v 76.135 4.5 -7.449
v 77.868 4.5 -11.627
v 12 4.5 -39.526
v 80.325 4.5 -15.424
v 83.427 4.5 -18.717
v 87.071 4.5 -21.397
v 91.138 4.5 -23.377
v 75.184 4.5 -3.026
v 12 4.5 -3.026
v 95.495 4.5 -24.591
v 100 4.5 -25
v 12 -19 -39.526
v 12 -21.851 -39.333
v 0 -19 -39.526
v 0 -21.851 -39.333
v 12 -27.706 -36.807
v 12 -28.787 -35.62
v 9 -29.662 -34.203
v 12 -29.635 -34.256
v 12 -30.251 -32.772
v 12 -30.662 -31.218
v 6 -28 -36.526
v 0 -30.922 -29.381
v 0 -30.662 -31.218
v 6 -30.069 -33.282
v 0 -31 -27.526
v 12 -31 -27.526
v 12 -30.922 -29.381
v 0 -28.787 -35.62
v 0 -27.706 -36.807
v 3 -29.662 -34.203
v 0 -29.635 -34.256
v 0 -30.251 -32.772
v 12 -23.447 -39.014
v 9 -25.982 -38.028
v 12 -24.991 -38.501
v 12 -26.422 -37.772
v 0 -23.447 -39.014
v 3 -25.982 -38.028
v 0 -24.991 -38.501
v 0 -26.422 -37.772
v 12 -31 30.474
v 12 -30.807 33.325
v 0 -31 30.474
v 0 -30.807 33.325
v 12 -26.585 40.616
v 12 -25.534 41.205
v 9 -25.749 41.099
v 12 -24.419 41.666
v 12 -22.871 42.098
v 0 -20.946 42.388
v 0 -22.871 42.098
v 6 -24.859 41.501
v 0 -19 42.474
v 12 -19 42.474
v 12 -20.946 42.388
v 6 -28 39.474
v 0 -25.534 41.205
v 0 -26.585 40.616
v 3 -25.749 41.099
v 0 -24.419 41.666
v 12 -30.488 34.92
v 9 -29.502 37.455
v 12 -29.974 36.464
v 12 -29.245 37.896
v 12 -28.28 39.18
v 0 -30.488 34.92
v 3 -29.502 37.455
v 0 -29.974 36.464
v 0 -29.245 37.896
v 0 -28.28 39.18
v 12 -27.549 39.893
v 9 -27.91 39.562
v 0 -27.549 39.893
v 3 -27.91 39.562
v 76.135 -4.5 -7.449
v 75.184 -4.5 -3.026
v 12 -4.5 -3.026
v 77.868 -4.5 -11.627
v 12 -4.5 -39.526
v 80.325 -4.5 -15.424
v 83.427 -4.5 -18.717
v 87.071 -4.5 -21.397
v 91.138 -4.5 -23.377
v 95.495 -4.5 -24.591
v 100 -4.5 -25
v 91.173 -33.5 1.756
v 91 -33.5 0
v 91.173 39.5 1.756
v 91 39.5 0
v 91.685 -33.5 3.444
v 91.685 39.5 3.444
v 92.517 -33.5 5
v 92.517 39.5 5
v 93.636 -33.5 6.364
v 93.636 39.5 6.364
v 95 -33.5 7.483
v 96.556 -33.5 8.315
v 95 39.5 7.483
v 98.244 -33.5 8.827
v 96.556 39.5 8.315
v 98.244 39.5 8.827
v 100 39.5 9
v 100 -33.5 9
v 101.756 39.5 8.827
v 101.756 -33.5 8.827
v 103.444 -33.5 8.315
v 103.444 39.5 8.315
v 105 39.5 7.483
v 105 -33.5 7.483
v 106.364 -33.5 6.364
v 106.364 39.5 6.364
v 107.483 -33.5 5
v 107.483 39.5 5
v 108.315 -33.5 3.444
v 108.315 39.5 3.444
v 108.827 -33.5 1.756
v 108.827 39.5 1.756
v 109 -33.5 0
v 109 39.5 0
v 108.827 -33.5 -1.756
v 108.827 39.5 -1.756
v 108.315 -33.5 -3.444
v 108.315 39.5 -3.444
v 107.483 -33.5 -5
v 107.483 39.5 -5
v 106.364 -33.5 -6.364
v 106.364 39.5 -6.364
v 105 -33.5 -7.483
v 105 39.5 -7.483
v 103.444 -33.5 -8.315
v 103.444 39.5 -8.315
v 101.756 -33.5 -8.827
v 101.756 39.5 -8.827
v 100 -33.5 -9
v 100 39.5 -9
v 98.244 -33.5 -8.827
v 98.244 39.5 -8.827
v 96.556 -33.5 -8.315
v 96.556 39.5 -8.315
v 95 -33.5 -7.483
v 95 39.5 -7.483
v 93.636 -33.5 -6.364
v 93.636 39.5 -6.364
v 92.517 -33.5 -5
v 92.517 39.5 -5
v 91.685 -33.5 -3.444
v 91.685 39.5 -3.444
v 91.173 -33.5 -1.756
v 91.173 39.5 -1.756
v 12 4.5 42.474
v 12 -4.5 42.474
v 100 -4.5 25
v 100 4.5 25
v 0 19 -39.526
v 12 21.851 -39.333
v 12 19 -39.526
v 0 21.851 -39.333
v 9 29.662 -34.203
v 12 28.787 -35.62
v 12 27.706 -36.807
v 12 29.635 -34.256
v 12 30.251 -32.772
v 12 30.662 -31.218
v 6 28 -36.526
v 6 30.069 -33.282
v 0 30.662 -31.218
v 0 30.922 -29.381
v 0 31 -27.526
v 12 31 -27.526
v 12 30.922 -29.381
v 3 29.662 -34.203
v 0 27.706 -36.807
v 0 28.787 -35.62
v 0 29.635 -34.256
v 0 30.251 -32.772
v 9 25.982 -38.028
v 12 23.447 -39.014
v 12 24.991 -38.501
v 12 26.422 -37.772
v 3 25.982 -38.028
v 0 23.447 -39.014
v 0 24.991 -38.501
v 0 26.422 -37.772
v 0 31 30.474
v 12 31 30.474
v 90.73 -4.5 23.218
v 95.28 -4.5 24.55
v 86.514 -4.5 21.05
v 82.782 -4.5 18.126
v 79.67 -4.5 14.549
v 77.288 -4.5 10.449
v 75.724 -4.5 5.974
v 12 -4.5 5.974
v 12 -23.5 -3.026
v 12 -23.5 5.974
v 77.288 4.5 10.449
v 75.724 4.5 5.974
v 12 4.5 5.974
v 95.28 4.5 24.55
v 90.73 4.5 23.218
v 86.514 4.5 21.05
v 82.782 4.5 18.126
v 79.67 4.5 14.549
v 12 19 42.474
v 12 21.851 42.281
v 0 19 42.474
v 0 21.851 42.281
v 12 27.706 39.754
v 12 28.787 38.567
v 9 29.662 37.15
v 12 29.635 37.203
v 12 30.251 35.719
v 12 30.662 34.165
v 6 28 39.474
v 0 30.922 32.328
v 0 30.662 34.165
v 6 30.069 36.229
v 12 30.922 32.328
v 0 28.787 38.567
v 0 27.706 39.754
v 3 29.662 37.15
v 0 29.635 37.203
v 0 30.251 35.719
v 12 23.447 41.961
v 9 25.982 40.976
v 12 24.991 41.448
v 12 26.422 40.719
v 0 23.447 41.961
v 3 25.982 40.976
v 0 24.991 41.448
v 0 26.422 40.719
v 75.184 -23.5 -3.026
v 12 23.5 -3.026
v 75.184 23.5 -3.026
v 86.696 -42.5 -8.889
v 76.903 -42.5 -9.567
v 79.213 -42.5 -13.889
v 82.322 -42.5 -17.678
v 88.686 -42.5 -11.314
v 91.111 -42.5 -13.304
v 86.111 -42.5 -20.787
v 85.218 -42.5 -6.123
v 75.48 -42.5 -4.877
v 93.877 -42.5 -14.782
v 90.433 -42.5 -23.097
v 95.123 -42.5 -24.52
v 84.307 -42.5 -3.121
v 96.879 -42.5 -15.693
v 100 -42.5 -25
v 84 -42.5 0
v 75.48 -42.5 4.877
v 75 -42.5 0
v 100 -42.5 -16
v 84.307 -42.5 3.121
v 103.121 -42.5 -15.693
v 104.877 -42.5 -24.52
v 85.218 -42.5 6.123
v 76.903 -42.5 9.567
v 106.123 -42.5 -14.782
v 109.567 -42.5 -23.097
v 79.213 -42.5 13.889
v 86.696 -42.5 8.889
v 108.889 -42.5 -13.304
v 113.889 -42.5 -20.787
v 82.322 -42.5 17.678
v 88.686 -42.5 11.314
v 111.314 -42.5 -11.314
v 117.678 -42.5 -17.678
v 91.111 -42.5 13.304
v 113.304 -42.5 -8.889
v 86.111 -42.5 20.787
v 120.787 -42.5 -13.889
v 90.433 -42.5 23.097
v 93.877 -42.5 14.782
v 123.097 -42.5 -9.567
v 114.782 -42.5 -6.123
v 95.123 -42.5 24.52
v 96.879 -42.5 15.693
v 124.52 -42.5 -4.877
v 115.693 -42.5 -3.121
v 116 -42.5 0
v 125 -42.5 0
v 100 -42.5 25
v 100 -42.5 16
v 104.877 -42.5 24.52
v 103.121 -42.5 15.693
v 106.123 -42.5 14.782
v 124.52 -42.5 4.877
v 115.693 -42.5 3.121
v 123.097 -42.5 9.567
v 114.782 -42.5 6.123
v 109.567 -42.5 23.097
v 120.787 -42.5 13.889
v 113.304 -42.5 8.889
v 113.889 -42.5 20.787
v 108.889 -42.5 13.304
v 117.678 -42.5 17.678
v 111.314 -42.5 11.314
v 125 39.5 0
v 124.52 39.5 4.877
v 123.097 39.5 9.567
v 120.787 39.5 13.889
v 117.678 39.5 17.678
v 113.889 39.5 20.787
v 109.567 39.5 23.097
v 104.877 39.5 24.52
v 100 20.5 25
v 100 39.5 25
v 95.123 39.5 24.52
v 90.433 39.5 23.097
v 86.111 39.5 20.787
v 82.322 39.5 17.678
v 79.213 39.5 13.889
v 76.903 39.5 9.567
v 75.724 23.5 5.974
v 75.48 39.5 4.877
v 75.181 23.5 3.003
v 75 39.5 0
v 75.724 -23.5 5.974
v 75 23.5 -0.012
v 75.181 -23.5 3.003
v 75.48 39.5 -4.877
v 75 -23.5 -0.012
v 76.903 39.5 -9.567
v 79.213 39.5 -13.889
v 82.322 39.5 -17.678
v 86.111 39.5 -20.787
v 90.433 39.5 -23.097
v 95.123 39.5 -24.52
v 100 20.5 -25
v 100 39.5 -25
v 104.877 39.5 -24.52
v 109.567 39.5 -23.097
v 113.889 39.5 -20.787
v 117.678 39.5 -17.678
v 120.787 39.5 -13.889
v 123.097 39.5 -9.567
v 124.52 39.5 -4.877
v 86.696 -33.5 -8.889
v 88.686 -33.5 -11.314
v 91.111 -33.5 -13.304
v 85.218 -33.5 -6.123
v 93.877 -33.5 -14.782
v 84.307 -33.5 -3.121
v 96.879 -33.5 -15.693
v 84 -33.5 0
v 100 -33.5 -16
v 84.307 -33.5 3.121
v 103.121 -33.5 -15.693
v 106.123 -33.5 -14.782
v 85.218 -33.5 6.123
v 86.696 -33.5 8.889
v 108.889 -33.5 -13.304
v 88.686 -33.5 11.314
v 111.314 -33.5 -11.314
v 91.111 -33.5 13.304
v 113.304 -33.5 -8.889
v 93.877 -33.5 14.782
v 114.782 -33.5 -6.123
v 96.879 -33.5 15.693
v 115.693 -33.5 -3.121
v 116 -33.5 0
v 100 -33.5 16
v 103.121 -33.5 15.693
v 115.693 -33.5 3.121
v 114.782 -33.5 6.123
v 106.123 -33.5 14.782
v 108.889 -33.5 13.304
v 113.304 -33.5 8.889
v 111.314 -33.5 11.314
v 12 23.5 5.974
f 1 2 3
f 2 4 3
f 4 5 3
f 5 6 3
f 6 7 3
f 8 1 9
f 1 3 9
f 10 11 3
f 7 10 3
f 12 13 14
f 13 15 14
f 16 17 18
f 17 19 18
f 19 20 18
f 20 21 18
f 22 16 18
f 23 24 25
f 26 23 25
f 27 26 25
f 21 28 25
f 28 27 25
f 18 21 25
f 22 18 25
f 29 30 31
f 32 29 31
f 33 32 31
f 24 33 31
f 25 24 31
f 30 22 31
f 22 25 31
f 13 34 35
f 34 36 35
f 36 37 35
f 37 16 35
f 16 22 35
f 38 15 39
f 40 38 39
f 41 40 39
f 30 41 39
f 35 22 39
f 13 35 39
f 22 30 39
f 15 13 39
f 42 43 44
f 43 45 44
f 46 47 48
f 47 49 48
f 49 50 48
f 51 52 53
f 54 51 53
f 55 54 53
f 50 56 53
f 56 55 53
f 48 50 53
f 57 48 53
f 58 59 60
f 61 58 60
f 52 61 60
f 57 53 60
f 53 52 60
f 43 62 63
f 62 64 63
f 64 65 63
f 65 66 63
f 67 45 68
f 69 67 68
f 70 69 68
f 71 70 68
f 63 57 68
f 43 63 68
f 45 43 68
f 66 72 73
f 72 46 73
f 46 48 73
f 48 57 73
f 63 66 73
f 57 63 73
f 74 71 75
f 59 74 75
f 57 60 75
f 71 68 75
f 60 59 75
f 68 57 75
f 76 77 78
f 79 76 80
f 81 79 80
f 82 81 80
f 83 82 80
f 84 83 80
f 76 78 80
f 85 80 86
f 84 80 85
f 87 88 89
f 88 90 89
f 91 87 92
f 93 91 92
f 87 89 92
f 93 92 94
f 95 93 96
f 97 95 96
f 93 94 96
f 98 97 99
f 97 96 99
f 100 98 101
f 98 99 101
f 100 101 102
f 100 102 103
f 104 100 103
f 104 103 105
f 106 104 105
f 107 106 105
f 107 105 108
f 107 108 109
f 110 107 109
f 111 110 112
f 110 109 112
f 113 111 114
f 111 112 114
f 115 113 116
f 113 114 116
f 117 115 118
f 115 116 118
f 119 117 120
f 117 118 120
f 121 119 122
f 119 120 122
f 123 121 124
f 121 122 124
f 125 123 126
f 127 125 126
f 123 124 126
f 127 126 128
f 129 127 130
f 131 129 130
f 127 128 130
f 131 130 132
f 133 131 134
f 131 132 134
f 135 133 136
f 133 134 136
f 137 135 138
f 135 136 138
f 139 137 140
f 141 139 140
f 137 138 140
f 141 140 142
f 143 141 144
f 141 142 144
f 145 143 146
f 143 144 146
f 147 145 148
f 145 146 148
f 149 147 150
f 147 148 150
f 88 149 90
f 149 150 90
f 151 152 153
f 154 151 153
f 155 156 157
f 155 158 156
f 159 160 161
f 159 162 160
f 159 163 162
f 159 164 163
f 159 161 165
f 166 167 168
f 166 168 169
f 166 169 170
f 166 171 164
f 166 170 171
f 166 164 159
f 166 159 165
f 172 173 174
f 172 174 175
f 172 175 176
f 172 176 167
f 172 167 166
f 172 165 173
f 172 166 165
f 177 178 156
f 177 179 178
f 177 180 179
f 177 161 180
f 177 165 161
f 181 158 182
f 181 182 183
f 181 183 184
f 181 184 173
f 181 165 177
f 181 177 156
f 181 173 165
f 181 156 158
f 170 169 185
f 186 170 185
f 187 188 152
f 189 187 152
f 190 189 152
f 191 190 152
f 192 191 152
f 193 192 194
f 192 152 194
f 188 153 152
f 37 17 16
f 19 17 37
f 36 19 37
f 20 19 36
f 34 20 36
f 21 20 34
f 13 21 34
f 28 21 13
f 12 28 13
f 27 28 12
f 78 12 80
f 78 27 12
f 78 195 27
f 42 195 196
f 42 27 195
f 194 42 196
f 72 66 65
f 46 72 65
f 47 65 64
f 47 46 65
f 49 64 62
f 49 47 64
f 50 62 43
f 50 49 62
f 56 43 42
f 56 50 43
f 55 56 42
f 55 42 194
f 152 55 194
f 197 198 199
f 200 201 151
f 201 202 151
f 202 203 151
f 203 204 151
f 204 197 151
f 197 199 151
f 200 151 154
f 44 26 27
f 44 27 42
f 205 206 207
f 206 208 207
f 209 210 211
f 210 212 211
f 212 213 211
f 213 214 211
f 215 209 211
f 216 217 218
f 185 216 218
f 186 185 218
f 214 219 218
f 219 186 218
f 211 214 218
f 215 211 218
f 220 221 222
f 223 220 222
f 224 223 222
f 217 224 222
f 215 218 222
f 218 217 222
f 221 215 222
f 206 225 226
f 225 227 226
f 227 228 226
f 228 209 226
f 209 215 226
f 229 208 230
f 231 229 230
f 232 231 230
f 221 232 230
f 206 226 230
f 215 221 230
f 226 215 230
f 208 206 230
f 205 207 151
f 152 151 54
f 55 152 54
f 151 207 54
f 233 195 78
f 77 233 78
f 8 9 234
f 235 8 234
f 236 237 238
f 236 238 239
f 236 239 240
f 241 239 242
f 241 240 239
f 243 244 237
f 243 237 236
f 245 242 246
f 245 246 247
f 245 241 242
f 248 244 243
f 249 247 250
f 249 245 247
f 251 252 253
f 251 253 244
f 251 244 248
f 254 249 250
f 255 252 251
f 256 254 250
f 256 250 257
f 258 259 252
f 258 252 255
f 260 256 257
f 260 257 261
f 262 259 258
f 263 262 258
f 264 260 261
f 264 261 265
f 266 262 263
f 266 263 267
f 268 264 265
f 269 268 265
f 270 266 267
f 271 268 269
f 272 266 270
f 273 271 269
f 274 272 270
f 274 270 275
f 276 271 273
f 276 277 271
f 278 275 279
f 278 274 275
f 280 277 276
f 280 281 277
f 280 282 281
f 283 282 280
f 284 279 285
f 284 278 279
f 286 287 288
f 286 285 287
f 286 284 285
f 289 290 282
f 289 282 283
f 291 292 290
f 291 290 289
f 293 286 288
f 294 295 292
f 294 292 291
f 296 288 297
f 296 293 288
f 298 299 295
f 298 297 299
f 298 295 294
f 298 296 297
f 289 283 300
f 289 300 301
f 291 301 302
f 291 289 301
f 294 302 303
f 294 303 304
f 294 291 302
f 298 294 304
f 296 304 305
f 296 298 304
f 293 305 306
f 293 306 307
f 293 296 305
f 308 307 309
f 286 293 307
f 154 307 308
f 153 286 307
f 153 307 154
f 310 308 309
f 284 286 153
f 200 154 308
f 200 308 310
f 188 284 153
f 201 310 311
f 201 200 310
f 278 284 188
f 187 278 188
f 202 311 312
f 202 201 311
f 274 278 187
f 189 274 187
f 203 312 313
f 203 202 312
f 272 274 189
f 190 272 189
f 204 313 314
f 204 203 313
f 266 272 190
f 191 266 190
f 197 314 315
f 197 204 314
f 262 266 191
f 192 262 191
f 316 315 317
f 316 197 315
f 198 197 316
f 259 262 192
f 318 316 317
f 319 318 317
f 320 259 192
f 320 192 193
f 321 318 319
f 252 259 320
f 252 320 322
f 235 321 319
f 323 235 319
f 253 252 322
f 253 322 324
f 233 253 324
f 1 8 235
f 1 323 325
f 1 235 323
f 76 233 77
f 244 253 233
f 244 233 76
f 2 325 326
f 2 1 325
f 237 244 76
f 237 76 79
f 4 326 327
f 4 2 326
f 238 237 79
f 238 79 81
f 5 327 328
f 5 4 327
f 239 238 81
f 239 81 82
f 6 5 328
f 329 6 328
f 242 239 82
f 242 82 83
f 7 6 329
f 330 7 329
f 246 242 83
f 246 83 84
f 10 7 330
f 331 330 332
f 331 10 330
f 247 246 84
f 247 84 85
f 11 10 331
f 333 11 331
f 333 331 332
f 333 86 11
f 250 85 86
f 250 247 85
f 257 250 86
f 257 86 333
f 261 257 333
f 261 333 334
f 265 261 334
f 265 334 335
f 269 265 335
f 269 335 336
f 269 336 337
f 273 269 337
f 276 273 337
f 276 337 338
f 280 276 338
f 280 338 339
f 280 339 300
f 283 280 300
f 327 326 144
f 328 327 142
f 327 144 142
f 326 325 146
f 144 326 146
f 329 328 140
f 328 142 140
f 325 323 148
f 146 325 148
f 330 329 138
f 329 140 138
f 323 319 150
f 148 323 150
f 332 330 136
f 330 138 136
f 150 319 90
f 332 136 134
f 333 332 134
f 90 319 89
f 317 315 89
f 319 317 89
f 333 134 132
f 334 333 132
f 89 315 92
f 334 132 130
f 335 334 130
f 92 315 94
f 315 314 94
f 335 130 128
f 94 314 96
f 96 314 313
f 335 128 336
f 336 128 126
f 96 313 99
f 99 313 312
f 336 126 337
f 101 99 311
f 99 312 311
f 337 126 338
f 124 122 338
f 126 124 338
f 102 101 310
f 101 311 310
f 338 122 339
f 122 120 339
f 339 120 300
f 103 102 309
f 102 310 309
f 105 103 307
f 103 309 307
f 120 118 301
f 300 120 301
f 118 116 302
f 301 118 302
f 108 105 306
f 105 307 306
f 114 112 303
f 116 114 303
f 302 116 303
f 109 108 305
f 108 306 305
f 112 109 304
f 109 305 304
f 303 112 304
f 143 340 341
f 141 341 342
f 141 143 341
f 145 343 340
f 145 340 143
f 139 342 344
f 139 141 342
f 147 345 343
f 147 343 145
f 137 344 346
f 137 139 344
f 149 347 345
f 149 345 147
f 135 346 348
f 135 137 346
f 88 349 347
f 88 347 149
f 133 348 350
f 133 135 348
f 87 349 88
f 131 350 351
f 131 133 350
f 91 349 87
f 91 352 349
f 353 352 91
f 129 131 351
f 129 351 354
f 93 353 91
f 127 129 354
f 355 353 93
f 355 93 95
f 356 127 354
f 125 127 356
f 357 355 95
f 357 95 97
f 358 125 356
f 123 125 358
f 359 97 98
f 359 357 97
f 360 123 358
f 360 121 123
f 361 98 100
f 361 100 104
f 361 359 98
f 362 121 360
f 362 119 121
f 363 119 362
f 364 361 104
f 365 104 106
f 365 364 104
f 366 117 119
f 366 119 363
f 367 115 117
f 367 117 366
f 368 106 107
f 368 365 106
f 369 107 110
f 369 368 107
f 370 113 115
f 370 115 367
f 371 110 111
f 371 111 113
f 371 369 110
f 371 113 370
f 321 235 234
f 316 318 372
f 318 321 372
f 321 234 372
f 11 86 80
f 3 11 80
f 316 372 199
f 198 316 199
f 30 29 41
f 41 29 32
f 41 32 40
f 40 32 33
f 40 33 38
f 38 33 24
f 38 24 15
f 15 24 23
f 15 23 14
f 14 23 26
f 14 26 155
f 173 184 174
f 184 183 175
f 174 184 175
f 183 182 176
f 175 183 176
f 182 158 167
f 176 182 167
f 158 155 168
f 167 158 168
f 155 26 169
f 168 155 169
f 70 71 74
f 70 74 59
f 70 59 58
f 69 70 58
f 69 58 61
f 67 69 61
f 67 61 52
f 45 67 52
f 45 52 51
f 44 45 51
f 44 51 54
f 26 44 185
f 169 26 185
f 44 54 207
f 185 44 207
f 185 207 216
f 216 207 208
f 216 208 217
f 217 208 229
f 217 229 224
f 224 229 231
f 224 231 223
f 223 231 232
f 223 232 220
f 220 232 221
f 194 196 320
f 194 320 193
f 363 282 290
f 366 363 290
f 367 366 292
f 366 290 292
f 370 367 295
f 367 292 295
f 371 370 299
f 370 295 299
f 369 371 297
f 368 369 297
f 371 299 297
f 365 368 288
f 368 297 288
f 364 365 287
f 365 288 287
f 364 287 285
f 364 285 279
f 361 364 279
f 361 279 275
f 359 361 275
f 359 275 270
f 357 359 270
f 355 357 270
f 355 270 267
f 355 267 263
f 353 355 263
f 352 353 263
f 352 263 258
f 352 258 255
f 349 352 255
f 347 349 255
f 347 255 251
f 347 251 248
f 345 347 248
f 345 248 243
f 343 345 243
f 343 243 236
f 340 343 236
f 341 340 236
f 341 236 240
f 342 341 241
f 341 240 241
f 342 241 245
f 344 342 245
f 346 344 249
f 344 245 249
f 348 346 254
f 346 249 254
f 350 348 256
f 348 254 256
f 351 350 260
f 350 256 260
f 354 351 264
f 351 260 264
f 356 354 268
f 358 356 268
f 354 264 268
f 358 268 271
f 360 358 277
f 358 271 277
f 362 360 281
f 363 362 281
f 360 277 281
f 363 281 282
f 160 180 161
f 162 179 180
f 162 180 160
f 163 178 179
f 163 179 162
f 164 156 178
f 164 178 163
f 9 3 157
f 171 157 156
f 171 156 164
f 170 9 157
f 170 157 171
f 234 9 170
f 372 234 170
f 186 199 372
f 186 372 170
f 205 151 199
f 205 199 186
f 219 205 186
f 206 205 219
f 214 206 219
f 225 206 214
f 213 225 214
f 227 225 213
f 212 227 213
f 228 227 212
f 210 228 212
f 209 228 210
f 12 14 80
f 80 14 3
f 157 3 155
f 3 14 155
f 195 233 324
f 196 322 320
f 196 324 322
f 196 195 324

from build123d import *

# Parameters (mm, degrees)
F0_W            = 62
F0_H            = 82
F1_DEPTH        = 12
F2_T1_DEPTH     = 72
F4_R            = 25
F5_DEPTH        = 42.5
F5_DEPTH_BACK   = 39.5
F3_W            = 19
F3_H            = 9
F6_DEPTH        = 88
F8_DEPTH        = 25
F10_DEPTH       = 25
F12_D           = 18
F12_DEPTH       = 90
F12_CBORE_D     = 32
F12_CBORE_DEPTH = 9
F12_TIP         = 5.4077455712


# Not quite as in the source:
# - a fillet or chamfer that OpenCascade refuses, or shapes differently, is made with other operations: its cross-section is extruded or revolved along the edge and cut away or added


with BuildPart() as f1:
    # F0 (on Right) → F1 (new body)
    with BuildSketch(Plane.YZ):
        with Locations((0, 1.4735981822)):
            Rectangle(F0_W, F0_H)
    extrude(amount=F1_DEPTH)

    # F2: fillet of radius 12 on 4 edges, made by hand

    # F2_s2 → F2_t1 (cut)
    with BuildSketch(Plane.YZ.offset(-30)):
        with BuildLine():
            add(Edge.make_bspline(
                [(-19, 42.4735981822), (-31, 42.4735981822), (-31, 30.4735981822)],
                knots=[0, 0, 0, 1, 1, 1], degree=2, weights=[1, 1, 1]))
            Line((-31, 30.4735981822), (-31, 42.4735981822))
            Line((-31, 42.4735981822), (-19, 42.4735981822))
        make_face()
        with BuildLine():
            add(Edge.make_bspline(
                [(31, 30.4735981822), (31, 42.4735981822), (19, 42.4735981822)],
                knots=[0, 0, 0, 1, 1, 1], degree=2, weights=[1, 1, 1]))
            Line((19, 42.4735981822), (31, 42.4735981822))
            Line((31, 42.4735981822), (31, 30.4735981822))
        make_face()
        with BuildLine():
            add(Edge.make_bspline(
                [(-31, -27.5264018178), (-31, -39.5264018178), (-19, -39.5264018178)],
                knots=[0, 0, 0, 1, 1, 1], degree=2, weights=[1, 1, 1]))
            Line((-19, -39.5264018178), (-31, -39.5264018178))
            Line((-31, -39.5264018178), (-31, -27.5264018178))
        make_face()
        with BuildLine():
            add(Edge.make_bspline(
                [(31, -27.5264018178), (31, -39.5264018178), (19, -39.5264018178)],
                knots=[0, 0, 0, 1, 1, 1], degree=2, weights=[1, 1, 1]))
            Line((19, -39.5264018178), (31, -39.5264018178))
            Line((31, -39.5264018178), (31, -27.5264018178))
        make_face()
    extrude(amount=F2_T1_DEPTH, mode=Mode.SUBTRACT)



with BuildPart() as f5:
    # F4 (on Front) → F5 (new body, two sides)
    with BuildSketch(Plane.XZ) as f5_sk:
        with Locations((100, 0)):
            Circle(F4_R)
    extrude(amount=F5_DEPTH)
    extrude(f5_sk.sketch, amount=-F5_DEPTH_BACK)


with BuildPart() as f1_1:
    add(f1.part)

    add(f5.part)  # F6 merges F5
    # F3 (on face) → F6 (join)
    with BuildSketch(Plane.YZ.offset(12)):
        Polygon((4.5, 5.9735981822), (4.5, 42.4735981822), (-4.5, 42.4735981822), (-4.5, 5.9735981822), (-4.5, -3.0264018178), (-4.5, -39.5264018178), (4.5, -39.5264018178), (4.5, -3.0264018178), (23.5, -3.0264018178), (23.5, 5.9735981822), align=None)
        with Locations((-14, 1.4735981822)):
            Rectangle(F3_W, F3_H)
    extrude(amount=F6_DEPTH)

    # F7 (on face) → F8 (cut)
    with BuildSketch(Plane.XZ.offset(4.5)):
        Polygon((100, 42.4735981822), (12, 42.4735981822), (100, 25), align=None)
    extrude(amount=-F8_DEPTH, mode=Mode.SUBTRACT)

    # F9 (on face) → F10 (cut)
    with BuildSketch(Plane.XZ.offset(4.5)):
        Polygon((100, -39.5264018178), (100, -25), (12, -39.5264018178), align=None)
    extrude(amount=-F10_DEPTH, mode=Mode.SUBTRACT)

    # F12
    with Locations(Plane.XZ.offset(42.5)):
        with Locations((100, 0)):
            CounterBoreHole(F12_D / 2, F12_CBORE_D / 2, F12_CBORE_DEPTH, depth=F12_DEPTH)
            with Locations((0, 0, -(F12_DEPTH + F12_TIP / 2))):  # 118° drill point
                Cone(0, F12_D / 2, F12_TIP, mode=Mode.SUBTRACT)


solid = f1_1.part
